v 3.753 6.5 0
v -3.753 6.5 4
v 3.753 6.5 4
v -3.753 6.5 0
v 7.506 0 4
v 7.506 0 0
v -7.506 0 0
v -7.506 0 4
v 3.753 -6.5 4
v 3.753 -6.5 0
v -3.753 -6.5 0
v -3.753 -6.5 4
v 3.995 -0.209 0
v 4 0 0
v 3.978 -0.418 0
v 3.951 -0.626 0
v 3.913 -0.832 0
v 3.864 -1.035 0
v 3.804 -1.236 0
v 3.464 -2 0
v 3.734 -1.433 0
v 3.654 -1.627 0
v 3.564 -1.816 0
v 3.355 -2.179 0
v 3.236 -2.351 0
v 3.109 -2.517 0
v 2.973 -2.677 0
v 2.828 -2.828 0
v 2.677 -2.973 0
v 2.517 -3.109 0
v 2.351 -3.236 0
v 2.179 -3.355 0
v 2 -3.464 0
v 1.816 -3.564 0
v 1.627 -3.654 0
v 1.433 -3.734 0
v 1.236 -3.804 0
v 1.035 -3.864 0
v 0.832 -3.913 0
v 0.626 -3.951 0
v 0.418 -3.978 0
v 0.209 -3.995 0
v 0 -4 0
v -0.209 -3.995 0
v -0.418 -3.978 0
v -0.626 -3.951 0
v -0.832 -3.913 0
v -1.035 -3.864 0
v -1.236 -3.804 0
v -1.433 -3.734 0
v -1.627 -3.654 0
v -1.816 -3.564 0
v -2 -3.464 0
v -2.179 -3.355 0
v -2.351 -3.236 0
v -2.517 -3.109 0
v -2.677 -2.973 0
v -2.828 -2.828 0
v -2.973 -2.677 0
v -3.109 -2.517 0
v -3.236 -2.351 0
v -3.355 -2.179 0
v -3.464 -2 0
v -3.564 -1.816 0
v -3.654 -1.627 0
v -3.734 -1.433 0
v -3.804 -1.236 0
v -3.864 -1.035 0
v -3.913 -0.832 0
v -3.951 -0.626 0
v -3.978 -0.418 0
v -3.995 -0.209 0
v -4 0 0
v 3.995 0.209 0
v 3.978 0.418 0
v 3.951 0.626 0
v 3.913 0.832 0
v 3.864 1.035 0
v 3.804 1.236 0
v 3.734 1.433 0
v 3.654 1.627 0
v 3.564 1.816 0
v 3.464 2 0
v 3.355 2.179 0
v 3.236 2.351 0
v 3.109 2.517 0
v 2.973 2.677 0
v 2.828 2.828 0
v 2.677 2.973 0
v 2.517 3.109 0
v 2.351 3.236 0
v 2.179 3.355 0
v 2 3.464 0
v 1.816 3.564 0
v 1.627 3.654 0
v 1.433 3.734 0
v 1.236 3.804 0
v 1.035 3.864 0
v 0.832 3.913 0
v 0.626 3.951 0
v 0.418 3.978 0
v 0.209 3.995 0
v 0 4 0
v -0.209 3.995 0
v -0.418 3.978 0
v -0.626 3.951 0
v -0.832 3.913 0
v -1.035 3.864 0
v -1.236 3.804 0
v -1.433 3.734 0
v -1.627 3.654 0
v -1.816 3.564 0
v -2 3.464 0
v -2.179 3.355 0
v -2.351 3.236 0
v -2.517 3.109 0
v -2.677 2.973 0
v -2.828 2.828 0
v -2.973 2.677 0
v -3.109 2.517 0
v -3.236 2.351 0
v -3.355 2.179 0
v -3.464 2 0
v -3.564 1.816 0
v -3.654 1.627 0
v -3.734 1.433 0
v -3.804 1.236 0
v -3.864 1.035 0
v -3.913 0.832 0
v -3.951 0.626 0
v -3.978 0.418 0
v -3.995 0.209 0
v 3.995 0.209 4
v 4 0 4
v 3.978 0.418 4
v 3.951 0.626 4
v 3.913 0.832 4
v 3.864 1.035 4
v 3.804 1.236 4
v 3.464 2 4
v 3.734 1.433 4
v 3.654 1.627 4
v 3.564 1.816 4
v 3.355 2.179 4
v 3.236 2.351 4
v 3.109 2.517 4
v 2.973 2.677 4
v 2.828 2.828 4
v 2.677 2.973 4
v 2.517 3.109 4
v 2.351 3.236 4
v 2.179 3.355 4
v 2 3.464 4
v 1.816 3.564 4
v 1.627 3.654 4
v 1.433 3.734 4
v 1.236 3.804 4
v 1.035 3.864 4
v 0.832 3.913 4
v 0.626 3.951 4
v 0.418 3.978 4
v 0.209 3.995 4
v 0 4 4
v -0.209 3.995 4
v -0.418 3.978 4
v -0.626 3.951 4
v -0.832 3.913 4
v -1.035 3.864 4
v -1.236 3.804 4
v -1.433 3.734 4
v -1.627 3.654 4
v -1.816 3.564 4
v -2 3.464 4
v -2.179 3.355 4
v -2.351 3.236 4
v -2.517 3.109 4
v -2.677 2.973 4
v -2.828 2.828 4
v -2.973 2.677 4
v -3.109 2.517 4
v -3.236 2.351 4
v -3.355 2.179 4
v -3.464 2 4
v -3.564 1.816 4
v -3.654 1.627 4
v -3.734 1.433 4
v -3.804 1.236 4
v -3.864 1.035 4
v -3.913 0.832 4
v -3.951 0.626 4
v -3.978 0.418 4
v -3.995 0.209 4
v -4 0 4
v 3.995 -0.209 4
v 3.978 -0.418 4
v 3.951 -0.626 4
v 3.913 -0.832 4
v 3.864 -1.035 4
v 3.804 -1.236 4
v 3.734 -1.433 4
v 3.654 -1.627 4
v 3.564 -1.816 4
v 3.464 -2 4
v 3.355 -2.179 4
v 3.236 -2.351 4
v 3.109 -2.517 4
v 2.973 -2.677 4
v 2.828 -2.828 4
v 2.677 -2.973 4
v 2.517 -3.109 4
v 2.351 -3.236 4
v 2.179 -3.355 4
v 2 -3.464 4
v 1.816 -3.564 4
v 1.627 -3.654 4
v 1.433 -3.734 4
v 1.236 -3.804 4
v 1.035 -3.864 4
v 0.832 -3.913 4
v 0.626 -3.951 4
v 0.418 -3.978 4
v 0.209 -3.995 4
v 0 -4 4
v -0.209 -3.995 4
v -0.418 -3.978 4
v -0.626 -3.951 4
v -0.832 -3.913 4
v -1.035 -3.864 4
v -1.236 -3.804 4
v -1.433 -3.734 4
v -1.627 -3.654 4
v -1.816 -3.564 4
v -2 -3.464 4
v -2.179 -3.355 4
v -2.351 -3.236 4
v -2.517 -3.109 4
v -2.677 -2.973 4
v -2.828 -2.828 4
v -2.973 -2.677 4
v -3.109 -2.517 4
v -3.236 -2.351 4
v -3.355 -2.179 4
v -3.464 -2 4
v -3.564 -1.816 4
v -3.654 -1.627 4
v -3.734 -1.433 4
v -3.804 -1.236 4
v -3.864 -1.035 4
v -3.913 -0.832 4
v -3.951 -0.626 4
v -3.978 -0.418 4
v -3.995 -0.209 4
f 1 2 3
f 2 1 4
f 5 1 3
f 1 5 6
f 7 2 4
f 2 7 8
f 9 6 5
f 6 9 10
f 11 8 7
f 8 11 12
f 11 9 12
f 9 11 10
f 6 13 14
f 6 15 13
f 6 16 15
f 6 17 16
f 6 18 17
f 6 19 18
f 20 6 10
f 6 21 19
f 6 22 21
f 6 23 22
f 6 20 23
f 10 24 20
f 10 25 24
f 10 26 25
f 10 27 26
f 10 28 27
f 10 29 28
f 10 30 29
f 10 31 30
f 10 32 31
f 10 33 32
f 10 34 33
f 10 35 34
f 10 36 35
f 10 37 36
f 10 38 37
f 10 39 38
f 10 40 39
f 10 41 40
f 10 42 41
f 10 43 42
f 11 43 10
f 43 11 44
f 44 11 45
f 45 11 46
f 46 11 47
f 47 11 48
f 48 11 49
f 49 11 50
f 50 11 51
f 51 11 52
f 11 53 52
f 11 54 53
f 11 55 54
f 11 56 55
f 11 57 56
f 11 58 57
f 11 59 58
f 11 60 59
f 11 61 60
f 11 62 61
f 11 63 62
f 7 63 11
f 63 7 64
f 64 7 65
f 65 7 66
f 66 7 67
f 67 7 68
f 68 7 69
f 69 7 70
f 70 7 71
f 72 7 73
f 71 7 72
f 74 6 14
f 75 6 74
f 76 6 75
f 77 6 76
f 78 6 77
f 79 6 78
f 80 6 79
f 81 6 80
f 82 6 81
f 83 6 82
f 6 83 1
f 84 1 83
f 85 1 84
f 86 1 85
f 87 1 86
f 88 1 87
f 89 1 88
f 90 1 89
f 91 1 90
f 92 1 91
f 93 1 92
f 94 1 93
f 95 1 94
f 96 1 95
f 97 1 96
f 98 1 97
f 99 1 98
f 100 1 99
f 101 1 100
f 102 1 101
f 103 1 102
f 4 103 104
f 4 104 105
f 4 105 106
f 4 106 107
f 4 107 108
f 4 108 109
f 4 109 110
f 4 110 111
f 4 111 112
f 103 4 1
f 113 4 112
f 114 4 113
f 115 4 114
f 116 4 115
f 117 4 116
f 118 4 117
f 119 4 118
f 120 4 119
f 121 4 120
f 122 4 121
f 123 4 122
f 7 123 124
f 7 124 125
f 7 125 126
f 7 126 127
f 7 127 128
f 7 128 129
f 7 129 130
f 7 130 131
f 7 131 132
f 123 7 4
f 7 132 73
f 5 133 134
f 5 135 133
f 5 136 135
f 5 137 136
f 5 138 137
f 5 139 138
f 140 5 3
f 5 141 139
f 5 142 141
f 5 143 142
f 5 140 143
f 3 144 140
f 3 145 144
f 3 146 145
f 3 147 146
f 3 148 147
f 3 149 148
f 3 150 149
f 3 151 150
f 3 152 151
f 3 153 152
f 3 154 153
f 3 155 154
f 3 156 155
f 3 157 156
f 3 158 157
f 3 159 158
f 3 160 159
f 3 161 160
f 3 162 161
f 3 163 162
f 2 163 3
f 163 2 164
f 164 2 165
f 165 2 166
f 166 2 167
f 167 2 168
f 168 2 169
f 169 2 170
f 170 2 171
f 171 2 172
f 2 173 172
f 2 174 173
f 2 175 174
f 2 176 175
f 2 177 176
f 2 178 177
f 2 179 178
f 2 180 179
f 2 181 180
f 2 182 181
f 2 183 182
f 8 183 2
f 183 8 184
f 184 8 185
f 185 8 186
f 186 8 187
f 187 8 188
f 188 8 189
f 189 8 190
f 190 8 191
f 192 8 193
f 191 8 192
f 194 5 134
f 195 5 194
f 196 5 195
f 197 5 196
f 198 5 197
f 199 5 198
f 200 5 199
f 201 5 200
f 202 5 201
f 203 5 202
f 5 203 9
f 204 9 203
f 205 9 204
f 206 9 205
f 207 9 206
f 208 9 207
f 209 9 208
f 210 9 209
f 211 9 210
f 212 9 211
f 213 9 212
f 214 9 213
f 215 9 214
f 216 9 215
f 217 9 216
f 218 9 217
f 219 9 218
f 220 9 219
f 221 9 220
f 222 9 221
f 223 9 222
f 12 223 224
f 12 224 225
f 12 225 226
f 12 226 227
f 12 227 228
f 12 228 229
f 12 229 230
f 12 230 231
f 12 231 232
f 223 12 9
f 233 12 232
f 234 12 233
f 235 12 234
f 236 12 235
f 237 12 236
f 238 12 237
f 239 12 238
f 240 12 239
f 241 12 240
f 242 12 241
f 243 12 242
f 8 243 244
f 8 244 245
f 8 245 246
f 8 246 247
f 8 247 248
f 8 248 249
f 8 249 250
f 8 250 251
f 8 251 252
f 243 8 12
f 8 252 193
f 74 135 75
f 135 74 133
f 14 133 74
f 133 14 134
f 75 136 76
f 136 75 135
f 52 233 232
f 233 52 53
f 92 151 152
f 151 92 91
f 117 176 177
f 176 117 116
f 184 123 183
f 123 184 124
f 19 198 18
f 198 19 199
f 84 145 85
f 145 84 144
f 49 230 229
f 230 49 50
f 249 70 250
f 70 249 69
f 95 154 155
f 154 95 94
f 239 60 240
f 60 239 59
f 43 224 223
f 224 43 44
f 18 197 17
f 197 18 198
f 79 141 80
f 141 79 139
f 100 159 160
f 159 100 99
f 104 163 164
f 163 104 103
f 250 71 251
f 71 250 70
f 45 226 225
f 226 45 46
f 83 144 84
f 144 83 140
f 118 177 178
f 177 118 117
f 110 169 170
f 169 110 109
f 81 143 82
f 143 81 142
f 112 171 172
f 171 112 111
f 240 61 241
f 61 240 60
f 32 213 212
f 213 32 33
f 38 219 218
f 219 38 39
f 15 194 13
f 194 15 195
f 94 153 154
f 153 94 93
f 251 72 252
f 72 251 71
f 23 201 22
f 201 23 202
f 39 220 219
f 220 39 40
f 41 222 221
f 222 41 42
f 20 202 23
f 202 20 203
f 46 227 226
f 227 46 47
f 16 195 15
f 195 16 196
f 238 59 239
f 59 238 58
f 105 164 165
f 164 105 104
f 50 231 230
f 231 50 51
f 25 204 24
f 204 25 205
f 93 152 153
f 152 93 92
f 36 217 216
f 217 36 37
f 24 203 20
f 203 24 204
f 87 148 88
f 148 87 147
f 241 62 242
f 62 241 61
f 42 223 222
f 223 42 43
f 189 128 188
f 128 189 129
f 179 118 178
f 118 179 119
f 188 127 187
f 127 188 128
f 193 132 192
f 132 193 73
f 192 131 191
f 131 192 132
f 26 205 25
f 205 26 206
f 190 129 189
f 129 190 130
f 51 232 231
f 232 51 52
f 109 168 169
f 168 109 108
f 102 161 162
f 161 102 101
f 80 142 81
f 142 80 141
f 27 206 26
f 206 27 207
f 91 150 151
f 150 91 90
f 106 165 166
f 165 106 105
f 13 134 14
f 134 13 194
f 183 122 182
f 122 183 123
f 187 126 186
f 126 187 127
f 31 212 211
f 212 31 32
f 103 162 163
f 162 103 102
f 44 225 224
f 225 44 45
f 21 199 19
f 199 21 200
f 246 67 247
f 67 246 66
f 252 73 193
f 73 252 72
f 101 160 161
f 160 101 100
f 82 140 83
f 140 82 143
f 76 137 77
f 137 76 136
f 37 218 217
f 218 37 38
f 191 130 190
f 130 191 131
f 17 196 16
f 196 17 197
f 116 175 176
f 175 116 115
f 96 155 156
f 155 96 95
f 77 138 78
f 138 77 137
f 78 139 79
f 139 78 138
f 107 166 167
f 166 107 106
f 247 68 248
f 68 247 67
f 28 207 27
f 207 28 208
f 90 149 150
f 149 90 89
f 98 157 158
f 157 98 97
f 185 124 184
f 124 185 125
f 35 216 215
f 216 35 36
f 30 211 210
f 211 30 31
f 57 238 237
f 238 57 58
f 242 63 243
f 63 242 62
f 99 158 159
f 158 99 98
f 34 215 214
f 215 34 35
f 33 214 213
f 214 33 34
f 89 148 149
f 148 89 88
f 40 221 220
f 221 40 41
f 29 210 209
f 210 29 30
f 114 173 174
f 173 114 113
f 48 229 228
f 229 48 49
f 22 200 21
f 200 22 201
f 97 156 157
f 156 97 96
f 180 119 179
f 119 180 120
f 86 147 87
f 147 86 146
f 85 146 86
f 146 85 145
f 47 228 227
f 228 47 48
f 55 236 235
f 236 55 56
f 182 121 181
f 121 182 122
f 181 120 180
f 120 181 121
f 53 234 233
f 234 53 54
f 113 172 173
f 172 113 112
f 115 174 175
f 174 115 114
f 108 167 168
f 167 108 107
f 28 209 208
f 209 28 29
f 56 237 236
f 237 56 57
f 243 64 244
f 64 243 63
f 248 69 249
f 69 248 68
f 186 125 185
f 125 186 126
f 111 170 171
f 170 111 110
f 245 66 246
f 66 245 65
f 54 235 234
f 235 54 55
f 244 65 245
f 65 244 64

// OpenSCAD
$fn = 120;

across_flats = 13.0;   // mm
thickness    = 4.0;    // mm
hole_d       = 8.0;    // mm (clearance as specified)

module hex_prism_af(af, h){
    // For a regular hexagon: across_flats = 2 * apothem = sqrt(3) * R
    // where R is circumradius (center to vertex)
    R = af / sqrt(3);
    linear_extrude(height = h)
        polygon([ for (i = [0:5]) [ R*cos(60*i), R*sin(60*i) ] ]);
}

difference(){
    hex_prism_af(across_flats, thickness);
    translate([0,0,-0.2])
        cylinder(d = hole_d, h = thickness + 0.4);
}
